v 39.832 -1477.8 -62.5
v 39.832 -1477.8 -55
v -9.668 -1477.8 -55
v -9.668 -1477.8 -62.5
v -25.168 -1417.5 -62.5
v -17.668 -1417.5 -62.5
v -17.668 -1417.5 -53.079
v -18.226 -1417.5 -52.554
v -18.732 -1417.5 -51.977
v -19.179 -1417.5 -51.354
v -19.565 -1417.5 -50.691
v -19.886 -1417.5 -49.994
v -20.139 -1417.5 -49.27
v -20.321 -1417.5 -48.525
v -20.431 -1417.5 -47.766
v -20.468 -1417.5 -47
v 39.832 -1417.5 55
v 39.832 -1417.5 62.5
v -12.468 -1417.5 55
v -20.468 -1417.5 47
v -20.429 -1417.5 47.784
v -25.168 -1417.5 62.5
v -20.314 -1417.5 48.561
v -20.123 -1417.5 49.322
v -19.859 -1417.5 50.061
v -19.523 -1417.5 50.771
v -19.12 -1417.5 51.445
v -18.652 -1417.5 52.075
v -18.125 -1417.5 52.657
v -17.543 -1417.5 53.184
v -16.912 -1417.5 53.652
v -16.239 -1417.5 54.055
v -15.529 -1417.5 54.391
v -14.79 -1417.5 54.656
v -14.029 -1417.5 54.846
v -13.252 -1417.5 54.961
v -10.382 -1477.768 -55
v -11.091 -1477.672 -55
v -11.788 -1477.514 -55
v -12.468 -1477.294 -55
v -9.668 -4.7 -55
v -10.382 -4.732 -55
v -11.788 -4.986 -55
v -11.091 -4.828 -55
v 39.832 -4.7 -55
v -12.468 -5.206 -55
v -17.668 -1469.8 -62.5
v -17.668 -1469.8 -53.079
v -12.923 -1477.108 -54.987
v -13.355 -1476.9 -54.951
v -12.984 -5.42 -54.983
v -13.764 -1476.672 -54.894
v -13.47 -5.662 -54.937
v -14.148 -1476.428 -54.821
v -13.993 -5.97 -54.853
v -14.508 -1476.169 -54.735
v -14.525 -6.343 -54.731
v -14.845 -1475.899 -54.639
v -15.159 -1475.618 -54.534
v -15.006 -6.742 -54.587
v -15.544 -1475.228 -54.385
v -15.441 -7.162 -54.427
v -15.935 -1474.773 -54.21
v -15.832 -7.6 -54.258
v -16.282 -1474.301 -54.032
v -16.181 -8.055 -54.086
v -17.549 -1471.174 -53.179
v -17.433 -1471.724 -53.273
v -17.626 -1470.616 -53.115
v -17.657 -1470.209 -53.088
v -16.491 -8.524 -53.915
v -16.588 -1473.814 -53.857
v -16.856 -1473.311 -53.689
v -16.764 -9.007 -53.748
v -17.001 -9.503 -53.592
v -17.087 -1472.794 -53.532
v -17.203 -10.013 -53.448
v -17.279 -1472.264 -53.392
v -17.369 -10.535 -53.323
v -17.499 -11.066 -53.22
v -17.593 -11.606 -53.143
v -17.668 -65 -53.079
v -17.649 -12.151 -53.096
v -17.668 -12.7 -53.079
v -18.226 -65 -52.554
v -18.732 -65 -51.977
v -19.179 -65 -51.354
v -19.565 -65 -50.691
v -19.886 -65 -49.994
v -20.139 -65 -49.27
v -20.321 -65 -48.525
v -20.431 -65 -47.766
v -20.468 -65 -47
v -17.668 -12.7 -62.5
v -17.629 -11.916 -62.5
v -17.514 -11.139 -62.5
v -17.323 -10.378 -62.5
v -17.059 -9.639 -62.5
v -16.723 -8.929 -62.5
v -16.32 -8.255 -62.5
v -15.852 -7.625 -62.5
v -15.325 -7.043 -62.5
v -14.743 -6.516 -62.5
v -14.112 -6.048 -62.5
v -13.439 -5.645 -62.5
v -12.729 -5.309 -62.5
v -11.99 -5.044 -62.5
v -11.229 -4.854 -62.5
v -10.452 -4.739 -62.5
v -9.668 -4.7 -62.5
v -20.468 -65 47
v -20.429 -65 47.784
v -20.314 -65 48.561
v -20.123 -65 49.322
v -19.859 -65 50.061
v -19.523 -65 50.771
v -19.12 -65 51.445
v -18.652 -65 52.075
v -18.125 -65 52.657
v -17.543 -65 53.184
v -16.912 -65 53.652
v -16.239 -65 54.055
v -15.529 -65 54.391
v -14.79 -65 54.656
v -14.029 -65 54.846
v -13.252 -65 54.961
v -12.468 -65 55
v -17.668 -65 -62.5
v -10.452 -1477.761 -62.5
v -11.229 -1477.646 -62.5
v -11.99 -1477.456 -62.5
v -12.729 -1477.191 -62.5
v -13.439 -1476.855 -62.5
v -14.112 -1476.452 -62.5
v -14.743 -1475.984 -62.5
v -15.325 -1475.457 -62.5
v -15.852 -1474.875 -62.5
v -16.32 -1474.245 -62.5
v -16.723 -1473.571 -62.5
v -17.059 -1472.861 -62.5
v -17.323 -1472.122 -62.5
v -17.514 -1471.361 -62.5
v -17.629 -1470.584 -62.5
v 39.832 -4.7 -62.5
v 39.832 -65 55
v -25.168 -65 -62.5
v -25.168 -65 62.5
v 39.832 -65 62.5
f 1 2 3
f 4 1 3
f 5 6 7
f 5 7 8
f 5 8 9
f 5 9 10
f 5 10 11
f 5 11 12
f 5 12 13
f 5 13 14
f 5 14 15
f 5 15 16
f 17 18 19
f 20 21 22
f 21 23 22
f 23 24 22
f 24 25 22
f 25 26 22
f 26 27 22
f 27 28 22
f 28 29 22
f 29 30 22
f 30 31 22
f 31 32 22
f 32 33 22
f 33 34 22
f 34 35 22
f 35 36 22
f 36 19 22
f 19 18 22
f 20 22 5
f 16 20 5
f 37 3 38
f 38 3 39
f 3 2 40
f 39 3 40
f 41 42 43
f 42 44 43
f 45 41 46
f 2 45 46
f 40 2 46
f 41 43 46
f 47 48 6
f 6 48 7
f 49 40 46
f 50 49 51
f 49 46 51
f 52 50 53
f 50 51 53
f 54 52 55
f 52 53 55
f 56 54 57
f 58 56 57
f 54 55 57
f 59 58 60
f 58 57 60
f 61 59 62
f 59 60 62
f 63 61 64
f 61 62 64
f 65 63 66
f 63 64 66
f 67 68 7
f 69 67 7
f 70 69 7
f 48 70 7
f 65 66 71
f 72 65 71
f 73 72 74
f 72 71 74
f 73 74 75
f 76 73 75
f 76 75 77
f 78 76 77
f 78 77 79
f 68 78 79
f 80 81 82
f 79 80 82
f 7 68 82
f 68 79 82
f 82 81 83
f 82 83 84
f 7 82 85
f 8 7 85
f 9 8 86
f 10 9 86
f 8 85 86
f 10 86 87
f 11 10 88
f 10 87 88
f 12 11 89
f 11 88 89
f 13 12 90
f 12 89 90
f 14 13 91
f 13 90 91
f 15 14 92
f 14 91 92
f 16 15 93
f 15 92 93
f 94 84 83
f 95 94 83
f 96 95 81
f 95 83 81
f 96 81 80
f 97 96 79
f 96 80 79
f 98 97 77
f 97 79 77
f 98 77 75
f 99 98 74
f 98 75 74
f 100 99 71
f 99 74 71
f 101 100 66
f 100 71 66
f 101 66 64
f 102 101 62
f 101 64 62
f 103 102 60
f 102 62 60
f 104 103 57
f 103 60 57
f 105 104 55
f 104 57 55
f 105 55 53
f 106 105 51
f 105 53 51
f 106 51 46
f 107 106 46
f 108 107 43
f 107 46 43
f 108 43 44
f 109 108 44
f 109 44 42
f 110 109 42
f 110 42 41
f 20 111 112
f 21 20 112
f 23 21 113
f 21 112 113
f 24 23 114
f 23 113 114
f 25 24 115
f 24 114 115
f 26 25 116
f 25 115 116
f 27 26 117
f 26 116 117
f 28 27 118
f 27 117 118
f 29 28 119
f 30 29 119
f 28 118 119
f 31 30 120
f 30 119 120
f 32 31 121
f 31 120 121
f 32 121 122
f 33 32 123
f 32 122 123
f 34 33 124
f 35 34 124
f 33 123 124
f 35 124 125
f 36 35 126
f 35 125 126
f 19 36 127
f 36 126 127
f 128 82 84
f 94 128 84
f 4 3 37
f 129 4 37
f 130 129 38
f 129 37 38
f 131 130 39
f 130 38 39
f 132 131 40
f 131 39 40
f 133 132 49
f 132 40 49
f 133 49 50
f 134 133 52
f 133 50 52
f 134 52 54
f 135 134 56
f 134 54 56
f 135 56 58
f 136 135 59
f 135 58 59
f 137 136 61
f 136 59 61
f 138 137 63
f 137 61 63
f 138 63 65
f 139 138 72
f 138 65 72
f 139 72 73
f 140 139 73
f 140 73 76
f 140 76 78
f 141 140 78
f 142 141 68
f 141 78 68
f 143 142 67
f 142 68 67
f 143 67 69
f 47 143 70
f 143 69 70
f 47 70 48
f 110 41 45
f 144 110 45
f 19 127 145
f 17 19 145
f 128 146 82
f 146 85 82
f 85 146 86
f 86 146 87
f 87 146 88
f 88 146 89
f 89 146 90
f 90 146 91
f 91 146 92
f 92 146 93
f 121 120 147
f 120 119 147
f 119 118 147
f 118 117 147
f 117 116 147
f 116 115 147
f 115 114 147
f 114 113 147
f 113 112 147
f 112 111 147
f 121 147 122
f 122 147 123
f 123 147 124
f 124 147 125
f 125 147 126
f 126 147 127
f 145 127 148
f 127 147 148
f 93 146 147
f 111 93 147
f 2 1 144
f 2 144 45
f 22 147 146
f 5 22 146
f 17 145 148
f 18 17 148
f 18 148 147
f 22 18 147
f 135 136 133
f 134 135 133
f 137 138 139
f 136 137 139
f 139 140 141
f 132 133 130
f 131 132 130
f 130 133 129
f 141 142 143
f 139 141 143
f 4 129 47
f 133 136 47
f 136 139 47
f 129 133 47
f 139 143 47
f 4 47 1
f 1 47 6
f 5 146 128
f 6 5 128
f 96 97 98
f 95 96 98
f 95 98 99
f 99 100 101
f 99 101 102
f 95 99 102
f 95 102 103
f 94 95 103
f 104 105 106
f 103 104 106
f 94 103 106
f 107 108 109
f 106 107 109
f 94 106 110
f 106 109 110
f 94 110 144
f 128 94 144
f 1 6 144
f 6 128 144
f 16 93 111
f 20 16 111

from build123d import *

# Parameters (mm, degrees)
F1_DEPTH = 1482.5
F3_DEPTH = 125.001
F5_DEPTH = 10


with BuildPart() as f1:
    # F0 (on Front) → F1 (new body)
    with BuildSketch(Plane.XZ):
        with BuildLine():
            Line((-25.16784, 62.5), (-25.16784, -62.5))
            Line((-25.16784, -62.5), (39.83216, -62.5))
            Line((39.83216, -62.5), (39.83216, -55))
            Line((39.83216, -55), (-12.46784, -55))
            ThreePointArc((-12.46784, -55), (-18.124695, -52.656854), (-20.46784, -47))
            Line((-20.46784, -47), (-20.46784, 47))
            ThreePointArc((-20.46784, 47), (-18.124695, 52.656854), (-12.46784, 55))
            Line((-12.46784, 55), (39.83216, 55))
            Line((39.83216, 55), (39.83216, 62.5))
            Line((39.83216, 62.5), (-25.16784, 62.5))
        make_face()
    extrude(amount=F1_DEPTH)

    # F2 (on face) → F3 (cut, through all)
    with BuildSketch(Plane.XY.offset(62.5)):
        with BuildLine():
            Line((39.83216, 0), (-25.16784, 0))
            Line((-25.16784, 0), (-25.16784, -65))
            Line((-25.16784, -65), (-17.66784, -65))
            Line((-17.66784, -65), (-17.66784, -12.7))
            ThreePointArc((-17.66784, -12.7), (-15.324695, -7.043146), (-9.66784, -4.7))
            Line((-9.66784, -4.7), (39.83216, -4.7))
            Line((39.83216, -4.7), (39.83216, 0))
        make_face()
        with BuildLine():
            Line((-17.66784, -1417.5), (-25.16784, -1417.5))
            Line((-25.16784, -1417.5), (-25.16784, -1482.5))
            Line((-25.16784, -1482.5), (39.83216, -1482.5))
            Line((39.83216, -1482.5), (39.83216, -1477.8))
            Line((39.83216, -1477.8), (-9.66784, -1477.8))
            ThreePointArc((-9.66784, -1477.8), (-15.324695, -1475.456854), (-17.66784, -1469.8))
            Line((-17.66784, -1469.8), (-17.66784, -1417.5))
        make_face()
    extrude(amount=-F3_DEPTH, mode=Mode.SUBTRACT)

    # F4 (on face) → F5 (cut)
    with BuildSketch(Plane.XY.offset(62.5)):
        with BuildLine():
            Line((-17.66784, -65), (39.83216, -65))
            Line((39.83216, -65), (39.83216, -4.7))
            Line((39.83216, -4.7), (-9.66784, -4.7))
            ThreePointArc((-9.66784, -4.7), (-15.324695, -7.043146), (-17.66784, -12.7))
            Line((-17.66784, -12.7), (-17.66784, -65))
        make_face()
        with BuildLine():
            Line((39.83216, -1417.5), (-17.66784, -1417.5))
            Line((-17.66784, -1417.5), (-17.66784, -1469.8))
            ThreePointArc((-17.66784, -1469.8), (-15.324695, -1475.456854), (-9.66784, -1477.8))
            Line((-9.66784, -1477.8), (39.83216, -1477.8))
            Line((39.83216, -1477.8), (39.83216, -1417.5))
        make_face()
    extrude(amount=-F5_DEPTH, mode=Mode.SUBTRACT)


solid = f1.part
